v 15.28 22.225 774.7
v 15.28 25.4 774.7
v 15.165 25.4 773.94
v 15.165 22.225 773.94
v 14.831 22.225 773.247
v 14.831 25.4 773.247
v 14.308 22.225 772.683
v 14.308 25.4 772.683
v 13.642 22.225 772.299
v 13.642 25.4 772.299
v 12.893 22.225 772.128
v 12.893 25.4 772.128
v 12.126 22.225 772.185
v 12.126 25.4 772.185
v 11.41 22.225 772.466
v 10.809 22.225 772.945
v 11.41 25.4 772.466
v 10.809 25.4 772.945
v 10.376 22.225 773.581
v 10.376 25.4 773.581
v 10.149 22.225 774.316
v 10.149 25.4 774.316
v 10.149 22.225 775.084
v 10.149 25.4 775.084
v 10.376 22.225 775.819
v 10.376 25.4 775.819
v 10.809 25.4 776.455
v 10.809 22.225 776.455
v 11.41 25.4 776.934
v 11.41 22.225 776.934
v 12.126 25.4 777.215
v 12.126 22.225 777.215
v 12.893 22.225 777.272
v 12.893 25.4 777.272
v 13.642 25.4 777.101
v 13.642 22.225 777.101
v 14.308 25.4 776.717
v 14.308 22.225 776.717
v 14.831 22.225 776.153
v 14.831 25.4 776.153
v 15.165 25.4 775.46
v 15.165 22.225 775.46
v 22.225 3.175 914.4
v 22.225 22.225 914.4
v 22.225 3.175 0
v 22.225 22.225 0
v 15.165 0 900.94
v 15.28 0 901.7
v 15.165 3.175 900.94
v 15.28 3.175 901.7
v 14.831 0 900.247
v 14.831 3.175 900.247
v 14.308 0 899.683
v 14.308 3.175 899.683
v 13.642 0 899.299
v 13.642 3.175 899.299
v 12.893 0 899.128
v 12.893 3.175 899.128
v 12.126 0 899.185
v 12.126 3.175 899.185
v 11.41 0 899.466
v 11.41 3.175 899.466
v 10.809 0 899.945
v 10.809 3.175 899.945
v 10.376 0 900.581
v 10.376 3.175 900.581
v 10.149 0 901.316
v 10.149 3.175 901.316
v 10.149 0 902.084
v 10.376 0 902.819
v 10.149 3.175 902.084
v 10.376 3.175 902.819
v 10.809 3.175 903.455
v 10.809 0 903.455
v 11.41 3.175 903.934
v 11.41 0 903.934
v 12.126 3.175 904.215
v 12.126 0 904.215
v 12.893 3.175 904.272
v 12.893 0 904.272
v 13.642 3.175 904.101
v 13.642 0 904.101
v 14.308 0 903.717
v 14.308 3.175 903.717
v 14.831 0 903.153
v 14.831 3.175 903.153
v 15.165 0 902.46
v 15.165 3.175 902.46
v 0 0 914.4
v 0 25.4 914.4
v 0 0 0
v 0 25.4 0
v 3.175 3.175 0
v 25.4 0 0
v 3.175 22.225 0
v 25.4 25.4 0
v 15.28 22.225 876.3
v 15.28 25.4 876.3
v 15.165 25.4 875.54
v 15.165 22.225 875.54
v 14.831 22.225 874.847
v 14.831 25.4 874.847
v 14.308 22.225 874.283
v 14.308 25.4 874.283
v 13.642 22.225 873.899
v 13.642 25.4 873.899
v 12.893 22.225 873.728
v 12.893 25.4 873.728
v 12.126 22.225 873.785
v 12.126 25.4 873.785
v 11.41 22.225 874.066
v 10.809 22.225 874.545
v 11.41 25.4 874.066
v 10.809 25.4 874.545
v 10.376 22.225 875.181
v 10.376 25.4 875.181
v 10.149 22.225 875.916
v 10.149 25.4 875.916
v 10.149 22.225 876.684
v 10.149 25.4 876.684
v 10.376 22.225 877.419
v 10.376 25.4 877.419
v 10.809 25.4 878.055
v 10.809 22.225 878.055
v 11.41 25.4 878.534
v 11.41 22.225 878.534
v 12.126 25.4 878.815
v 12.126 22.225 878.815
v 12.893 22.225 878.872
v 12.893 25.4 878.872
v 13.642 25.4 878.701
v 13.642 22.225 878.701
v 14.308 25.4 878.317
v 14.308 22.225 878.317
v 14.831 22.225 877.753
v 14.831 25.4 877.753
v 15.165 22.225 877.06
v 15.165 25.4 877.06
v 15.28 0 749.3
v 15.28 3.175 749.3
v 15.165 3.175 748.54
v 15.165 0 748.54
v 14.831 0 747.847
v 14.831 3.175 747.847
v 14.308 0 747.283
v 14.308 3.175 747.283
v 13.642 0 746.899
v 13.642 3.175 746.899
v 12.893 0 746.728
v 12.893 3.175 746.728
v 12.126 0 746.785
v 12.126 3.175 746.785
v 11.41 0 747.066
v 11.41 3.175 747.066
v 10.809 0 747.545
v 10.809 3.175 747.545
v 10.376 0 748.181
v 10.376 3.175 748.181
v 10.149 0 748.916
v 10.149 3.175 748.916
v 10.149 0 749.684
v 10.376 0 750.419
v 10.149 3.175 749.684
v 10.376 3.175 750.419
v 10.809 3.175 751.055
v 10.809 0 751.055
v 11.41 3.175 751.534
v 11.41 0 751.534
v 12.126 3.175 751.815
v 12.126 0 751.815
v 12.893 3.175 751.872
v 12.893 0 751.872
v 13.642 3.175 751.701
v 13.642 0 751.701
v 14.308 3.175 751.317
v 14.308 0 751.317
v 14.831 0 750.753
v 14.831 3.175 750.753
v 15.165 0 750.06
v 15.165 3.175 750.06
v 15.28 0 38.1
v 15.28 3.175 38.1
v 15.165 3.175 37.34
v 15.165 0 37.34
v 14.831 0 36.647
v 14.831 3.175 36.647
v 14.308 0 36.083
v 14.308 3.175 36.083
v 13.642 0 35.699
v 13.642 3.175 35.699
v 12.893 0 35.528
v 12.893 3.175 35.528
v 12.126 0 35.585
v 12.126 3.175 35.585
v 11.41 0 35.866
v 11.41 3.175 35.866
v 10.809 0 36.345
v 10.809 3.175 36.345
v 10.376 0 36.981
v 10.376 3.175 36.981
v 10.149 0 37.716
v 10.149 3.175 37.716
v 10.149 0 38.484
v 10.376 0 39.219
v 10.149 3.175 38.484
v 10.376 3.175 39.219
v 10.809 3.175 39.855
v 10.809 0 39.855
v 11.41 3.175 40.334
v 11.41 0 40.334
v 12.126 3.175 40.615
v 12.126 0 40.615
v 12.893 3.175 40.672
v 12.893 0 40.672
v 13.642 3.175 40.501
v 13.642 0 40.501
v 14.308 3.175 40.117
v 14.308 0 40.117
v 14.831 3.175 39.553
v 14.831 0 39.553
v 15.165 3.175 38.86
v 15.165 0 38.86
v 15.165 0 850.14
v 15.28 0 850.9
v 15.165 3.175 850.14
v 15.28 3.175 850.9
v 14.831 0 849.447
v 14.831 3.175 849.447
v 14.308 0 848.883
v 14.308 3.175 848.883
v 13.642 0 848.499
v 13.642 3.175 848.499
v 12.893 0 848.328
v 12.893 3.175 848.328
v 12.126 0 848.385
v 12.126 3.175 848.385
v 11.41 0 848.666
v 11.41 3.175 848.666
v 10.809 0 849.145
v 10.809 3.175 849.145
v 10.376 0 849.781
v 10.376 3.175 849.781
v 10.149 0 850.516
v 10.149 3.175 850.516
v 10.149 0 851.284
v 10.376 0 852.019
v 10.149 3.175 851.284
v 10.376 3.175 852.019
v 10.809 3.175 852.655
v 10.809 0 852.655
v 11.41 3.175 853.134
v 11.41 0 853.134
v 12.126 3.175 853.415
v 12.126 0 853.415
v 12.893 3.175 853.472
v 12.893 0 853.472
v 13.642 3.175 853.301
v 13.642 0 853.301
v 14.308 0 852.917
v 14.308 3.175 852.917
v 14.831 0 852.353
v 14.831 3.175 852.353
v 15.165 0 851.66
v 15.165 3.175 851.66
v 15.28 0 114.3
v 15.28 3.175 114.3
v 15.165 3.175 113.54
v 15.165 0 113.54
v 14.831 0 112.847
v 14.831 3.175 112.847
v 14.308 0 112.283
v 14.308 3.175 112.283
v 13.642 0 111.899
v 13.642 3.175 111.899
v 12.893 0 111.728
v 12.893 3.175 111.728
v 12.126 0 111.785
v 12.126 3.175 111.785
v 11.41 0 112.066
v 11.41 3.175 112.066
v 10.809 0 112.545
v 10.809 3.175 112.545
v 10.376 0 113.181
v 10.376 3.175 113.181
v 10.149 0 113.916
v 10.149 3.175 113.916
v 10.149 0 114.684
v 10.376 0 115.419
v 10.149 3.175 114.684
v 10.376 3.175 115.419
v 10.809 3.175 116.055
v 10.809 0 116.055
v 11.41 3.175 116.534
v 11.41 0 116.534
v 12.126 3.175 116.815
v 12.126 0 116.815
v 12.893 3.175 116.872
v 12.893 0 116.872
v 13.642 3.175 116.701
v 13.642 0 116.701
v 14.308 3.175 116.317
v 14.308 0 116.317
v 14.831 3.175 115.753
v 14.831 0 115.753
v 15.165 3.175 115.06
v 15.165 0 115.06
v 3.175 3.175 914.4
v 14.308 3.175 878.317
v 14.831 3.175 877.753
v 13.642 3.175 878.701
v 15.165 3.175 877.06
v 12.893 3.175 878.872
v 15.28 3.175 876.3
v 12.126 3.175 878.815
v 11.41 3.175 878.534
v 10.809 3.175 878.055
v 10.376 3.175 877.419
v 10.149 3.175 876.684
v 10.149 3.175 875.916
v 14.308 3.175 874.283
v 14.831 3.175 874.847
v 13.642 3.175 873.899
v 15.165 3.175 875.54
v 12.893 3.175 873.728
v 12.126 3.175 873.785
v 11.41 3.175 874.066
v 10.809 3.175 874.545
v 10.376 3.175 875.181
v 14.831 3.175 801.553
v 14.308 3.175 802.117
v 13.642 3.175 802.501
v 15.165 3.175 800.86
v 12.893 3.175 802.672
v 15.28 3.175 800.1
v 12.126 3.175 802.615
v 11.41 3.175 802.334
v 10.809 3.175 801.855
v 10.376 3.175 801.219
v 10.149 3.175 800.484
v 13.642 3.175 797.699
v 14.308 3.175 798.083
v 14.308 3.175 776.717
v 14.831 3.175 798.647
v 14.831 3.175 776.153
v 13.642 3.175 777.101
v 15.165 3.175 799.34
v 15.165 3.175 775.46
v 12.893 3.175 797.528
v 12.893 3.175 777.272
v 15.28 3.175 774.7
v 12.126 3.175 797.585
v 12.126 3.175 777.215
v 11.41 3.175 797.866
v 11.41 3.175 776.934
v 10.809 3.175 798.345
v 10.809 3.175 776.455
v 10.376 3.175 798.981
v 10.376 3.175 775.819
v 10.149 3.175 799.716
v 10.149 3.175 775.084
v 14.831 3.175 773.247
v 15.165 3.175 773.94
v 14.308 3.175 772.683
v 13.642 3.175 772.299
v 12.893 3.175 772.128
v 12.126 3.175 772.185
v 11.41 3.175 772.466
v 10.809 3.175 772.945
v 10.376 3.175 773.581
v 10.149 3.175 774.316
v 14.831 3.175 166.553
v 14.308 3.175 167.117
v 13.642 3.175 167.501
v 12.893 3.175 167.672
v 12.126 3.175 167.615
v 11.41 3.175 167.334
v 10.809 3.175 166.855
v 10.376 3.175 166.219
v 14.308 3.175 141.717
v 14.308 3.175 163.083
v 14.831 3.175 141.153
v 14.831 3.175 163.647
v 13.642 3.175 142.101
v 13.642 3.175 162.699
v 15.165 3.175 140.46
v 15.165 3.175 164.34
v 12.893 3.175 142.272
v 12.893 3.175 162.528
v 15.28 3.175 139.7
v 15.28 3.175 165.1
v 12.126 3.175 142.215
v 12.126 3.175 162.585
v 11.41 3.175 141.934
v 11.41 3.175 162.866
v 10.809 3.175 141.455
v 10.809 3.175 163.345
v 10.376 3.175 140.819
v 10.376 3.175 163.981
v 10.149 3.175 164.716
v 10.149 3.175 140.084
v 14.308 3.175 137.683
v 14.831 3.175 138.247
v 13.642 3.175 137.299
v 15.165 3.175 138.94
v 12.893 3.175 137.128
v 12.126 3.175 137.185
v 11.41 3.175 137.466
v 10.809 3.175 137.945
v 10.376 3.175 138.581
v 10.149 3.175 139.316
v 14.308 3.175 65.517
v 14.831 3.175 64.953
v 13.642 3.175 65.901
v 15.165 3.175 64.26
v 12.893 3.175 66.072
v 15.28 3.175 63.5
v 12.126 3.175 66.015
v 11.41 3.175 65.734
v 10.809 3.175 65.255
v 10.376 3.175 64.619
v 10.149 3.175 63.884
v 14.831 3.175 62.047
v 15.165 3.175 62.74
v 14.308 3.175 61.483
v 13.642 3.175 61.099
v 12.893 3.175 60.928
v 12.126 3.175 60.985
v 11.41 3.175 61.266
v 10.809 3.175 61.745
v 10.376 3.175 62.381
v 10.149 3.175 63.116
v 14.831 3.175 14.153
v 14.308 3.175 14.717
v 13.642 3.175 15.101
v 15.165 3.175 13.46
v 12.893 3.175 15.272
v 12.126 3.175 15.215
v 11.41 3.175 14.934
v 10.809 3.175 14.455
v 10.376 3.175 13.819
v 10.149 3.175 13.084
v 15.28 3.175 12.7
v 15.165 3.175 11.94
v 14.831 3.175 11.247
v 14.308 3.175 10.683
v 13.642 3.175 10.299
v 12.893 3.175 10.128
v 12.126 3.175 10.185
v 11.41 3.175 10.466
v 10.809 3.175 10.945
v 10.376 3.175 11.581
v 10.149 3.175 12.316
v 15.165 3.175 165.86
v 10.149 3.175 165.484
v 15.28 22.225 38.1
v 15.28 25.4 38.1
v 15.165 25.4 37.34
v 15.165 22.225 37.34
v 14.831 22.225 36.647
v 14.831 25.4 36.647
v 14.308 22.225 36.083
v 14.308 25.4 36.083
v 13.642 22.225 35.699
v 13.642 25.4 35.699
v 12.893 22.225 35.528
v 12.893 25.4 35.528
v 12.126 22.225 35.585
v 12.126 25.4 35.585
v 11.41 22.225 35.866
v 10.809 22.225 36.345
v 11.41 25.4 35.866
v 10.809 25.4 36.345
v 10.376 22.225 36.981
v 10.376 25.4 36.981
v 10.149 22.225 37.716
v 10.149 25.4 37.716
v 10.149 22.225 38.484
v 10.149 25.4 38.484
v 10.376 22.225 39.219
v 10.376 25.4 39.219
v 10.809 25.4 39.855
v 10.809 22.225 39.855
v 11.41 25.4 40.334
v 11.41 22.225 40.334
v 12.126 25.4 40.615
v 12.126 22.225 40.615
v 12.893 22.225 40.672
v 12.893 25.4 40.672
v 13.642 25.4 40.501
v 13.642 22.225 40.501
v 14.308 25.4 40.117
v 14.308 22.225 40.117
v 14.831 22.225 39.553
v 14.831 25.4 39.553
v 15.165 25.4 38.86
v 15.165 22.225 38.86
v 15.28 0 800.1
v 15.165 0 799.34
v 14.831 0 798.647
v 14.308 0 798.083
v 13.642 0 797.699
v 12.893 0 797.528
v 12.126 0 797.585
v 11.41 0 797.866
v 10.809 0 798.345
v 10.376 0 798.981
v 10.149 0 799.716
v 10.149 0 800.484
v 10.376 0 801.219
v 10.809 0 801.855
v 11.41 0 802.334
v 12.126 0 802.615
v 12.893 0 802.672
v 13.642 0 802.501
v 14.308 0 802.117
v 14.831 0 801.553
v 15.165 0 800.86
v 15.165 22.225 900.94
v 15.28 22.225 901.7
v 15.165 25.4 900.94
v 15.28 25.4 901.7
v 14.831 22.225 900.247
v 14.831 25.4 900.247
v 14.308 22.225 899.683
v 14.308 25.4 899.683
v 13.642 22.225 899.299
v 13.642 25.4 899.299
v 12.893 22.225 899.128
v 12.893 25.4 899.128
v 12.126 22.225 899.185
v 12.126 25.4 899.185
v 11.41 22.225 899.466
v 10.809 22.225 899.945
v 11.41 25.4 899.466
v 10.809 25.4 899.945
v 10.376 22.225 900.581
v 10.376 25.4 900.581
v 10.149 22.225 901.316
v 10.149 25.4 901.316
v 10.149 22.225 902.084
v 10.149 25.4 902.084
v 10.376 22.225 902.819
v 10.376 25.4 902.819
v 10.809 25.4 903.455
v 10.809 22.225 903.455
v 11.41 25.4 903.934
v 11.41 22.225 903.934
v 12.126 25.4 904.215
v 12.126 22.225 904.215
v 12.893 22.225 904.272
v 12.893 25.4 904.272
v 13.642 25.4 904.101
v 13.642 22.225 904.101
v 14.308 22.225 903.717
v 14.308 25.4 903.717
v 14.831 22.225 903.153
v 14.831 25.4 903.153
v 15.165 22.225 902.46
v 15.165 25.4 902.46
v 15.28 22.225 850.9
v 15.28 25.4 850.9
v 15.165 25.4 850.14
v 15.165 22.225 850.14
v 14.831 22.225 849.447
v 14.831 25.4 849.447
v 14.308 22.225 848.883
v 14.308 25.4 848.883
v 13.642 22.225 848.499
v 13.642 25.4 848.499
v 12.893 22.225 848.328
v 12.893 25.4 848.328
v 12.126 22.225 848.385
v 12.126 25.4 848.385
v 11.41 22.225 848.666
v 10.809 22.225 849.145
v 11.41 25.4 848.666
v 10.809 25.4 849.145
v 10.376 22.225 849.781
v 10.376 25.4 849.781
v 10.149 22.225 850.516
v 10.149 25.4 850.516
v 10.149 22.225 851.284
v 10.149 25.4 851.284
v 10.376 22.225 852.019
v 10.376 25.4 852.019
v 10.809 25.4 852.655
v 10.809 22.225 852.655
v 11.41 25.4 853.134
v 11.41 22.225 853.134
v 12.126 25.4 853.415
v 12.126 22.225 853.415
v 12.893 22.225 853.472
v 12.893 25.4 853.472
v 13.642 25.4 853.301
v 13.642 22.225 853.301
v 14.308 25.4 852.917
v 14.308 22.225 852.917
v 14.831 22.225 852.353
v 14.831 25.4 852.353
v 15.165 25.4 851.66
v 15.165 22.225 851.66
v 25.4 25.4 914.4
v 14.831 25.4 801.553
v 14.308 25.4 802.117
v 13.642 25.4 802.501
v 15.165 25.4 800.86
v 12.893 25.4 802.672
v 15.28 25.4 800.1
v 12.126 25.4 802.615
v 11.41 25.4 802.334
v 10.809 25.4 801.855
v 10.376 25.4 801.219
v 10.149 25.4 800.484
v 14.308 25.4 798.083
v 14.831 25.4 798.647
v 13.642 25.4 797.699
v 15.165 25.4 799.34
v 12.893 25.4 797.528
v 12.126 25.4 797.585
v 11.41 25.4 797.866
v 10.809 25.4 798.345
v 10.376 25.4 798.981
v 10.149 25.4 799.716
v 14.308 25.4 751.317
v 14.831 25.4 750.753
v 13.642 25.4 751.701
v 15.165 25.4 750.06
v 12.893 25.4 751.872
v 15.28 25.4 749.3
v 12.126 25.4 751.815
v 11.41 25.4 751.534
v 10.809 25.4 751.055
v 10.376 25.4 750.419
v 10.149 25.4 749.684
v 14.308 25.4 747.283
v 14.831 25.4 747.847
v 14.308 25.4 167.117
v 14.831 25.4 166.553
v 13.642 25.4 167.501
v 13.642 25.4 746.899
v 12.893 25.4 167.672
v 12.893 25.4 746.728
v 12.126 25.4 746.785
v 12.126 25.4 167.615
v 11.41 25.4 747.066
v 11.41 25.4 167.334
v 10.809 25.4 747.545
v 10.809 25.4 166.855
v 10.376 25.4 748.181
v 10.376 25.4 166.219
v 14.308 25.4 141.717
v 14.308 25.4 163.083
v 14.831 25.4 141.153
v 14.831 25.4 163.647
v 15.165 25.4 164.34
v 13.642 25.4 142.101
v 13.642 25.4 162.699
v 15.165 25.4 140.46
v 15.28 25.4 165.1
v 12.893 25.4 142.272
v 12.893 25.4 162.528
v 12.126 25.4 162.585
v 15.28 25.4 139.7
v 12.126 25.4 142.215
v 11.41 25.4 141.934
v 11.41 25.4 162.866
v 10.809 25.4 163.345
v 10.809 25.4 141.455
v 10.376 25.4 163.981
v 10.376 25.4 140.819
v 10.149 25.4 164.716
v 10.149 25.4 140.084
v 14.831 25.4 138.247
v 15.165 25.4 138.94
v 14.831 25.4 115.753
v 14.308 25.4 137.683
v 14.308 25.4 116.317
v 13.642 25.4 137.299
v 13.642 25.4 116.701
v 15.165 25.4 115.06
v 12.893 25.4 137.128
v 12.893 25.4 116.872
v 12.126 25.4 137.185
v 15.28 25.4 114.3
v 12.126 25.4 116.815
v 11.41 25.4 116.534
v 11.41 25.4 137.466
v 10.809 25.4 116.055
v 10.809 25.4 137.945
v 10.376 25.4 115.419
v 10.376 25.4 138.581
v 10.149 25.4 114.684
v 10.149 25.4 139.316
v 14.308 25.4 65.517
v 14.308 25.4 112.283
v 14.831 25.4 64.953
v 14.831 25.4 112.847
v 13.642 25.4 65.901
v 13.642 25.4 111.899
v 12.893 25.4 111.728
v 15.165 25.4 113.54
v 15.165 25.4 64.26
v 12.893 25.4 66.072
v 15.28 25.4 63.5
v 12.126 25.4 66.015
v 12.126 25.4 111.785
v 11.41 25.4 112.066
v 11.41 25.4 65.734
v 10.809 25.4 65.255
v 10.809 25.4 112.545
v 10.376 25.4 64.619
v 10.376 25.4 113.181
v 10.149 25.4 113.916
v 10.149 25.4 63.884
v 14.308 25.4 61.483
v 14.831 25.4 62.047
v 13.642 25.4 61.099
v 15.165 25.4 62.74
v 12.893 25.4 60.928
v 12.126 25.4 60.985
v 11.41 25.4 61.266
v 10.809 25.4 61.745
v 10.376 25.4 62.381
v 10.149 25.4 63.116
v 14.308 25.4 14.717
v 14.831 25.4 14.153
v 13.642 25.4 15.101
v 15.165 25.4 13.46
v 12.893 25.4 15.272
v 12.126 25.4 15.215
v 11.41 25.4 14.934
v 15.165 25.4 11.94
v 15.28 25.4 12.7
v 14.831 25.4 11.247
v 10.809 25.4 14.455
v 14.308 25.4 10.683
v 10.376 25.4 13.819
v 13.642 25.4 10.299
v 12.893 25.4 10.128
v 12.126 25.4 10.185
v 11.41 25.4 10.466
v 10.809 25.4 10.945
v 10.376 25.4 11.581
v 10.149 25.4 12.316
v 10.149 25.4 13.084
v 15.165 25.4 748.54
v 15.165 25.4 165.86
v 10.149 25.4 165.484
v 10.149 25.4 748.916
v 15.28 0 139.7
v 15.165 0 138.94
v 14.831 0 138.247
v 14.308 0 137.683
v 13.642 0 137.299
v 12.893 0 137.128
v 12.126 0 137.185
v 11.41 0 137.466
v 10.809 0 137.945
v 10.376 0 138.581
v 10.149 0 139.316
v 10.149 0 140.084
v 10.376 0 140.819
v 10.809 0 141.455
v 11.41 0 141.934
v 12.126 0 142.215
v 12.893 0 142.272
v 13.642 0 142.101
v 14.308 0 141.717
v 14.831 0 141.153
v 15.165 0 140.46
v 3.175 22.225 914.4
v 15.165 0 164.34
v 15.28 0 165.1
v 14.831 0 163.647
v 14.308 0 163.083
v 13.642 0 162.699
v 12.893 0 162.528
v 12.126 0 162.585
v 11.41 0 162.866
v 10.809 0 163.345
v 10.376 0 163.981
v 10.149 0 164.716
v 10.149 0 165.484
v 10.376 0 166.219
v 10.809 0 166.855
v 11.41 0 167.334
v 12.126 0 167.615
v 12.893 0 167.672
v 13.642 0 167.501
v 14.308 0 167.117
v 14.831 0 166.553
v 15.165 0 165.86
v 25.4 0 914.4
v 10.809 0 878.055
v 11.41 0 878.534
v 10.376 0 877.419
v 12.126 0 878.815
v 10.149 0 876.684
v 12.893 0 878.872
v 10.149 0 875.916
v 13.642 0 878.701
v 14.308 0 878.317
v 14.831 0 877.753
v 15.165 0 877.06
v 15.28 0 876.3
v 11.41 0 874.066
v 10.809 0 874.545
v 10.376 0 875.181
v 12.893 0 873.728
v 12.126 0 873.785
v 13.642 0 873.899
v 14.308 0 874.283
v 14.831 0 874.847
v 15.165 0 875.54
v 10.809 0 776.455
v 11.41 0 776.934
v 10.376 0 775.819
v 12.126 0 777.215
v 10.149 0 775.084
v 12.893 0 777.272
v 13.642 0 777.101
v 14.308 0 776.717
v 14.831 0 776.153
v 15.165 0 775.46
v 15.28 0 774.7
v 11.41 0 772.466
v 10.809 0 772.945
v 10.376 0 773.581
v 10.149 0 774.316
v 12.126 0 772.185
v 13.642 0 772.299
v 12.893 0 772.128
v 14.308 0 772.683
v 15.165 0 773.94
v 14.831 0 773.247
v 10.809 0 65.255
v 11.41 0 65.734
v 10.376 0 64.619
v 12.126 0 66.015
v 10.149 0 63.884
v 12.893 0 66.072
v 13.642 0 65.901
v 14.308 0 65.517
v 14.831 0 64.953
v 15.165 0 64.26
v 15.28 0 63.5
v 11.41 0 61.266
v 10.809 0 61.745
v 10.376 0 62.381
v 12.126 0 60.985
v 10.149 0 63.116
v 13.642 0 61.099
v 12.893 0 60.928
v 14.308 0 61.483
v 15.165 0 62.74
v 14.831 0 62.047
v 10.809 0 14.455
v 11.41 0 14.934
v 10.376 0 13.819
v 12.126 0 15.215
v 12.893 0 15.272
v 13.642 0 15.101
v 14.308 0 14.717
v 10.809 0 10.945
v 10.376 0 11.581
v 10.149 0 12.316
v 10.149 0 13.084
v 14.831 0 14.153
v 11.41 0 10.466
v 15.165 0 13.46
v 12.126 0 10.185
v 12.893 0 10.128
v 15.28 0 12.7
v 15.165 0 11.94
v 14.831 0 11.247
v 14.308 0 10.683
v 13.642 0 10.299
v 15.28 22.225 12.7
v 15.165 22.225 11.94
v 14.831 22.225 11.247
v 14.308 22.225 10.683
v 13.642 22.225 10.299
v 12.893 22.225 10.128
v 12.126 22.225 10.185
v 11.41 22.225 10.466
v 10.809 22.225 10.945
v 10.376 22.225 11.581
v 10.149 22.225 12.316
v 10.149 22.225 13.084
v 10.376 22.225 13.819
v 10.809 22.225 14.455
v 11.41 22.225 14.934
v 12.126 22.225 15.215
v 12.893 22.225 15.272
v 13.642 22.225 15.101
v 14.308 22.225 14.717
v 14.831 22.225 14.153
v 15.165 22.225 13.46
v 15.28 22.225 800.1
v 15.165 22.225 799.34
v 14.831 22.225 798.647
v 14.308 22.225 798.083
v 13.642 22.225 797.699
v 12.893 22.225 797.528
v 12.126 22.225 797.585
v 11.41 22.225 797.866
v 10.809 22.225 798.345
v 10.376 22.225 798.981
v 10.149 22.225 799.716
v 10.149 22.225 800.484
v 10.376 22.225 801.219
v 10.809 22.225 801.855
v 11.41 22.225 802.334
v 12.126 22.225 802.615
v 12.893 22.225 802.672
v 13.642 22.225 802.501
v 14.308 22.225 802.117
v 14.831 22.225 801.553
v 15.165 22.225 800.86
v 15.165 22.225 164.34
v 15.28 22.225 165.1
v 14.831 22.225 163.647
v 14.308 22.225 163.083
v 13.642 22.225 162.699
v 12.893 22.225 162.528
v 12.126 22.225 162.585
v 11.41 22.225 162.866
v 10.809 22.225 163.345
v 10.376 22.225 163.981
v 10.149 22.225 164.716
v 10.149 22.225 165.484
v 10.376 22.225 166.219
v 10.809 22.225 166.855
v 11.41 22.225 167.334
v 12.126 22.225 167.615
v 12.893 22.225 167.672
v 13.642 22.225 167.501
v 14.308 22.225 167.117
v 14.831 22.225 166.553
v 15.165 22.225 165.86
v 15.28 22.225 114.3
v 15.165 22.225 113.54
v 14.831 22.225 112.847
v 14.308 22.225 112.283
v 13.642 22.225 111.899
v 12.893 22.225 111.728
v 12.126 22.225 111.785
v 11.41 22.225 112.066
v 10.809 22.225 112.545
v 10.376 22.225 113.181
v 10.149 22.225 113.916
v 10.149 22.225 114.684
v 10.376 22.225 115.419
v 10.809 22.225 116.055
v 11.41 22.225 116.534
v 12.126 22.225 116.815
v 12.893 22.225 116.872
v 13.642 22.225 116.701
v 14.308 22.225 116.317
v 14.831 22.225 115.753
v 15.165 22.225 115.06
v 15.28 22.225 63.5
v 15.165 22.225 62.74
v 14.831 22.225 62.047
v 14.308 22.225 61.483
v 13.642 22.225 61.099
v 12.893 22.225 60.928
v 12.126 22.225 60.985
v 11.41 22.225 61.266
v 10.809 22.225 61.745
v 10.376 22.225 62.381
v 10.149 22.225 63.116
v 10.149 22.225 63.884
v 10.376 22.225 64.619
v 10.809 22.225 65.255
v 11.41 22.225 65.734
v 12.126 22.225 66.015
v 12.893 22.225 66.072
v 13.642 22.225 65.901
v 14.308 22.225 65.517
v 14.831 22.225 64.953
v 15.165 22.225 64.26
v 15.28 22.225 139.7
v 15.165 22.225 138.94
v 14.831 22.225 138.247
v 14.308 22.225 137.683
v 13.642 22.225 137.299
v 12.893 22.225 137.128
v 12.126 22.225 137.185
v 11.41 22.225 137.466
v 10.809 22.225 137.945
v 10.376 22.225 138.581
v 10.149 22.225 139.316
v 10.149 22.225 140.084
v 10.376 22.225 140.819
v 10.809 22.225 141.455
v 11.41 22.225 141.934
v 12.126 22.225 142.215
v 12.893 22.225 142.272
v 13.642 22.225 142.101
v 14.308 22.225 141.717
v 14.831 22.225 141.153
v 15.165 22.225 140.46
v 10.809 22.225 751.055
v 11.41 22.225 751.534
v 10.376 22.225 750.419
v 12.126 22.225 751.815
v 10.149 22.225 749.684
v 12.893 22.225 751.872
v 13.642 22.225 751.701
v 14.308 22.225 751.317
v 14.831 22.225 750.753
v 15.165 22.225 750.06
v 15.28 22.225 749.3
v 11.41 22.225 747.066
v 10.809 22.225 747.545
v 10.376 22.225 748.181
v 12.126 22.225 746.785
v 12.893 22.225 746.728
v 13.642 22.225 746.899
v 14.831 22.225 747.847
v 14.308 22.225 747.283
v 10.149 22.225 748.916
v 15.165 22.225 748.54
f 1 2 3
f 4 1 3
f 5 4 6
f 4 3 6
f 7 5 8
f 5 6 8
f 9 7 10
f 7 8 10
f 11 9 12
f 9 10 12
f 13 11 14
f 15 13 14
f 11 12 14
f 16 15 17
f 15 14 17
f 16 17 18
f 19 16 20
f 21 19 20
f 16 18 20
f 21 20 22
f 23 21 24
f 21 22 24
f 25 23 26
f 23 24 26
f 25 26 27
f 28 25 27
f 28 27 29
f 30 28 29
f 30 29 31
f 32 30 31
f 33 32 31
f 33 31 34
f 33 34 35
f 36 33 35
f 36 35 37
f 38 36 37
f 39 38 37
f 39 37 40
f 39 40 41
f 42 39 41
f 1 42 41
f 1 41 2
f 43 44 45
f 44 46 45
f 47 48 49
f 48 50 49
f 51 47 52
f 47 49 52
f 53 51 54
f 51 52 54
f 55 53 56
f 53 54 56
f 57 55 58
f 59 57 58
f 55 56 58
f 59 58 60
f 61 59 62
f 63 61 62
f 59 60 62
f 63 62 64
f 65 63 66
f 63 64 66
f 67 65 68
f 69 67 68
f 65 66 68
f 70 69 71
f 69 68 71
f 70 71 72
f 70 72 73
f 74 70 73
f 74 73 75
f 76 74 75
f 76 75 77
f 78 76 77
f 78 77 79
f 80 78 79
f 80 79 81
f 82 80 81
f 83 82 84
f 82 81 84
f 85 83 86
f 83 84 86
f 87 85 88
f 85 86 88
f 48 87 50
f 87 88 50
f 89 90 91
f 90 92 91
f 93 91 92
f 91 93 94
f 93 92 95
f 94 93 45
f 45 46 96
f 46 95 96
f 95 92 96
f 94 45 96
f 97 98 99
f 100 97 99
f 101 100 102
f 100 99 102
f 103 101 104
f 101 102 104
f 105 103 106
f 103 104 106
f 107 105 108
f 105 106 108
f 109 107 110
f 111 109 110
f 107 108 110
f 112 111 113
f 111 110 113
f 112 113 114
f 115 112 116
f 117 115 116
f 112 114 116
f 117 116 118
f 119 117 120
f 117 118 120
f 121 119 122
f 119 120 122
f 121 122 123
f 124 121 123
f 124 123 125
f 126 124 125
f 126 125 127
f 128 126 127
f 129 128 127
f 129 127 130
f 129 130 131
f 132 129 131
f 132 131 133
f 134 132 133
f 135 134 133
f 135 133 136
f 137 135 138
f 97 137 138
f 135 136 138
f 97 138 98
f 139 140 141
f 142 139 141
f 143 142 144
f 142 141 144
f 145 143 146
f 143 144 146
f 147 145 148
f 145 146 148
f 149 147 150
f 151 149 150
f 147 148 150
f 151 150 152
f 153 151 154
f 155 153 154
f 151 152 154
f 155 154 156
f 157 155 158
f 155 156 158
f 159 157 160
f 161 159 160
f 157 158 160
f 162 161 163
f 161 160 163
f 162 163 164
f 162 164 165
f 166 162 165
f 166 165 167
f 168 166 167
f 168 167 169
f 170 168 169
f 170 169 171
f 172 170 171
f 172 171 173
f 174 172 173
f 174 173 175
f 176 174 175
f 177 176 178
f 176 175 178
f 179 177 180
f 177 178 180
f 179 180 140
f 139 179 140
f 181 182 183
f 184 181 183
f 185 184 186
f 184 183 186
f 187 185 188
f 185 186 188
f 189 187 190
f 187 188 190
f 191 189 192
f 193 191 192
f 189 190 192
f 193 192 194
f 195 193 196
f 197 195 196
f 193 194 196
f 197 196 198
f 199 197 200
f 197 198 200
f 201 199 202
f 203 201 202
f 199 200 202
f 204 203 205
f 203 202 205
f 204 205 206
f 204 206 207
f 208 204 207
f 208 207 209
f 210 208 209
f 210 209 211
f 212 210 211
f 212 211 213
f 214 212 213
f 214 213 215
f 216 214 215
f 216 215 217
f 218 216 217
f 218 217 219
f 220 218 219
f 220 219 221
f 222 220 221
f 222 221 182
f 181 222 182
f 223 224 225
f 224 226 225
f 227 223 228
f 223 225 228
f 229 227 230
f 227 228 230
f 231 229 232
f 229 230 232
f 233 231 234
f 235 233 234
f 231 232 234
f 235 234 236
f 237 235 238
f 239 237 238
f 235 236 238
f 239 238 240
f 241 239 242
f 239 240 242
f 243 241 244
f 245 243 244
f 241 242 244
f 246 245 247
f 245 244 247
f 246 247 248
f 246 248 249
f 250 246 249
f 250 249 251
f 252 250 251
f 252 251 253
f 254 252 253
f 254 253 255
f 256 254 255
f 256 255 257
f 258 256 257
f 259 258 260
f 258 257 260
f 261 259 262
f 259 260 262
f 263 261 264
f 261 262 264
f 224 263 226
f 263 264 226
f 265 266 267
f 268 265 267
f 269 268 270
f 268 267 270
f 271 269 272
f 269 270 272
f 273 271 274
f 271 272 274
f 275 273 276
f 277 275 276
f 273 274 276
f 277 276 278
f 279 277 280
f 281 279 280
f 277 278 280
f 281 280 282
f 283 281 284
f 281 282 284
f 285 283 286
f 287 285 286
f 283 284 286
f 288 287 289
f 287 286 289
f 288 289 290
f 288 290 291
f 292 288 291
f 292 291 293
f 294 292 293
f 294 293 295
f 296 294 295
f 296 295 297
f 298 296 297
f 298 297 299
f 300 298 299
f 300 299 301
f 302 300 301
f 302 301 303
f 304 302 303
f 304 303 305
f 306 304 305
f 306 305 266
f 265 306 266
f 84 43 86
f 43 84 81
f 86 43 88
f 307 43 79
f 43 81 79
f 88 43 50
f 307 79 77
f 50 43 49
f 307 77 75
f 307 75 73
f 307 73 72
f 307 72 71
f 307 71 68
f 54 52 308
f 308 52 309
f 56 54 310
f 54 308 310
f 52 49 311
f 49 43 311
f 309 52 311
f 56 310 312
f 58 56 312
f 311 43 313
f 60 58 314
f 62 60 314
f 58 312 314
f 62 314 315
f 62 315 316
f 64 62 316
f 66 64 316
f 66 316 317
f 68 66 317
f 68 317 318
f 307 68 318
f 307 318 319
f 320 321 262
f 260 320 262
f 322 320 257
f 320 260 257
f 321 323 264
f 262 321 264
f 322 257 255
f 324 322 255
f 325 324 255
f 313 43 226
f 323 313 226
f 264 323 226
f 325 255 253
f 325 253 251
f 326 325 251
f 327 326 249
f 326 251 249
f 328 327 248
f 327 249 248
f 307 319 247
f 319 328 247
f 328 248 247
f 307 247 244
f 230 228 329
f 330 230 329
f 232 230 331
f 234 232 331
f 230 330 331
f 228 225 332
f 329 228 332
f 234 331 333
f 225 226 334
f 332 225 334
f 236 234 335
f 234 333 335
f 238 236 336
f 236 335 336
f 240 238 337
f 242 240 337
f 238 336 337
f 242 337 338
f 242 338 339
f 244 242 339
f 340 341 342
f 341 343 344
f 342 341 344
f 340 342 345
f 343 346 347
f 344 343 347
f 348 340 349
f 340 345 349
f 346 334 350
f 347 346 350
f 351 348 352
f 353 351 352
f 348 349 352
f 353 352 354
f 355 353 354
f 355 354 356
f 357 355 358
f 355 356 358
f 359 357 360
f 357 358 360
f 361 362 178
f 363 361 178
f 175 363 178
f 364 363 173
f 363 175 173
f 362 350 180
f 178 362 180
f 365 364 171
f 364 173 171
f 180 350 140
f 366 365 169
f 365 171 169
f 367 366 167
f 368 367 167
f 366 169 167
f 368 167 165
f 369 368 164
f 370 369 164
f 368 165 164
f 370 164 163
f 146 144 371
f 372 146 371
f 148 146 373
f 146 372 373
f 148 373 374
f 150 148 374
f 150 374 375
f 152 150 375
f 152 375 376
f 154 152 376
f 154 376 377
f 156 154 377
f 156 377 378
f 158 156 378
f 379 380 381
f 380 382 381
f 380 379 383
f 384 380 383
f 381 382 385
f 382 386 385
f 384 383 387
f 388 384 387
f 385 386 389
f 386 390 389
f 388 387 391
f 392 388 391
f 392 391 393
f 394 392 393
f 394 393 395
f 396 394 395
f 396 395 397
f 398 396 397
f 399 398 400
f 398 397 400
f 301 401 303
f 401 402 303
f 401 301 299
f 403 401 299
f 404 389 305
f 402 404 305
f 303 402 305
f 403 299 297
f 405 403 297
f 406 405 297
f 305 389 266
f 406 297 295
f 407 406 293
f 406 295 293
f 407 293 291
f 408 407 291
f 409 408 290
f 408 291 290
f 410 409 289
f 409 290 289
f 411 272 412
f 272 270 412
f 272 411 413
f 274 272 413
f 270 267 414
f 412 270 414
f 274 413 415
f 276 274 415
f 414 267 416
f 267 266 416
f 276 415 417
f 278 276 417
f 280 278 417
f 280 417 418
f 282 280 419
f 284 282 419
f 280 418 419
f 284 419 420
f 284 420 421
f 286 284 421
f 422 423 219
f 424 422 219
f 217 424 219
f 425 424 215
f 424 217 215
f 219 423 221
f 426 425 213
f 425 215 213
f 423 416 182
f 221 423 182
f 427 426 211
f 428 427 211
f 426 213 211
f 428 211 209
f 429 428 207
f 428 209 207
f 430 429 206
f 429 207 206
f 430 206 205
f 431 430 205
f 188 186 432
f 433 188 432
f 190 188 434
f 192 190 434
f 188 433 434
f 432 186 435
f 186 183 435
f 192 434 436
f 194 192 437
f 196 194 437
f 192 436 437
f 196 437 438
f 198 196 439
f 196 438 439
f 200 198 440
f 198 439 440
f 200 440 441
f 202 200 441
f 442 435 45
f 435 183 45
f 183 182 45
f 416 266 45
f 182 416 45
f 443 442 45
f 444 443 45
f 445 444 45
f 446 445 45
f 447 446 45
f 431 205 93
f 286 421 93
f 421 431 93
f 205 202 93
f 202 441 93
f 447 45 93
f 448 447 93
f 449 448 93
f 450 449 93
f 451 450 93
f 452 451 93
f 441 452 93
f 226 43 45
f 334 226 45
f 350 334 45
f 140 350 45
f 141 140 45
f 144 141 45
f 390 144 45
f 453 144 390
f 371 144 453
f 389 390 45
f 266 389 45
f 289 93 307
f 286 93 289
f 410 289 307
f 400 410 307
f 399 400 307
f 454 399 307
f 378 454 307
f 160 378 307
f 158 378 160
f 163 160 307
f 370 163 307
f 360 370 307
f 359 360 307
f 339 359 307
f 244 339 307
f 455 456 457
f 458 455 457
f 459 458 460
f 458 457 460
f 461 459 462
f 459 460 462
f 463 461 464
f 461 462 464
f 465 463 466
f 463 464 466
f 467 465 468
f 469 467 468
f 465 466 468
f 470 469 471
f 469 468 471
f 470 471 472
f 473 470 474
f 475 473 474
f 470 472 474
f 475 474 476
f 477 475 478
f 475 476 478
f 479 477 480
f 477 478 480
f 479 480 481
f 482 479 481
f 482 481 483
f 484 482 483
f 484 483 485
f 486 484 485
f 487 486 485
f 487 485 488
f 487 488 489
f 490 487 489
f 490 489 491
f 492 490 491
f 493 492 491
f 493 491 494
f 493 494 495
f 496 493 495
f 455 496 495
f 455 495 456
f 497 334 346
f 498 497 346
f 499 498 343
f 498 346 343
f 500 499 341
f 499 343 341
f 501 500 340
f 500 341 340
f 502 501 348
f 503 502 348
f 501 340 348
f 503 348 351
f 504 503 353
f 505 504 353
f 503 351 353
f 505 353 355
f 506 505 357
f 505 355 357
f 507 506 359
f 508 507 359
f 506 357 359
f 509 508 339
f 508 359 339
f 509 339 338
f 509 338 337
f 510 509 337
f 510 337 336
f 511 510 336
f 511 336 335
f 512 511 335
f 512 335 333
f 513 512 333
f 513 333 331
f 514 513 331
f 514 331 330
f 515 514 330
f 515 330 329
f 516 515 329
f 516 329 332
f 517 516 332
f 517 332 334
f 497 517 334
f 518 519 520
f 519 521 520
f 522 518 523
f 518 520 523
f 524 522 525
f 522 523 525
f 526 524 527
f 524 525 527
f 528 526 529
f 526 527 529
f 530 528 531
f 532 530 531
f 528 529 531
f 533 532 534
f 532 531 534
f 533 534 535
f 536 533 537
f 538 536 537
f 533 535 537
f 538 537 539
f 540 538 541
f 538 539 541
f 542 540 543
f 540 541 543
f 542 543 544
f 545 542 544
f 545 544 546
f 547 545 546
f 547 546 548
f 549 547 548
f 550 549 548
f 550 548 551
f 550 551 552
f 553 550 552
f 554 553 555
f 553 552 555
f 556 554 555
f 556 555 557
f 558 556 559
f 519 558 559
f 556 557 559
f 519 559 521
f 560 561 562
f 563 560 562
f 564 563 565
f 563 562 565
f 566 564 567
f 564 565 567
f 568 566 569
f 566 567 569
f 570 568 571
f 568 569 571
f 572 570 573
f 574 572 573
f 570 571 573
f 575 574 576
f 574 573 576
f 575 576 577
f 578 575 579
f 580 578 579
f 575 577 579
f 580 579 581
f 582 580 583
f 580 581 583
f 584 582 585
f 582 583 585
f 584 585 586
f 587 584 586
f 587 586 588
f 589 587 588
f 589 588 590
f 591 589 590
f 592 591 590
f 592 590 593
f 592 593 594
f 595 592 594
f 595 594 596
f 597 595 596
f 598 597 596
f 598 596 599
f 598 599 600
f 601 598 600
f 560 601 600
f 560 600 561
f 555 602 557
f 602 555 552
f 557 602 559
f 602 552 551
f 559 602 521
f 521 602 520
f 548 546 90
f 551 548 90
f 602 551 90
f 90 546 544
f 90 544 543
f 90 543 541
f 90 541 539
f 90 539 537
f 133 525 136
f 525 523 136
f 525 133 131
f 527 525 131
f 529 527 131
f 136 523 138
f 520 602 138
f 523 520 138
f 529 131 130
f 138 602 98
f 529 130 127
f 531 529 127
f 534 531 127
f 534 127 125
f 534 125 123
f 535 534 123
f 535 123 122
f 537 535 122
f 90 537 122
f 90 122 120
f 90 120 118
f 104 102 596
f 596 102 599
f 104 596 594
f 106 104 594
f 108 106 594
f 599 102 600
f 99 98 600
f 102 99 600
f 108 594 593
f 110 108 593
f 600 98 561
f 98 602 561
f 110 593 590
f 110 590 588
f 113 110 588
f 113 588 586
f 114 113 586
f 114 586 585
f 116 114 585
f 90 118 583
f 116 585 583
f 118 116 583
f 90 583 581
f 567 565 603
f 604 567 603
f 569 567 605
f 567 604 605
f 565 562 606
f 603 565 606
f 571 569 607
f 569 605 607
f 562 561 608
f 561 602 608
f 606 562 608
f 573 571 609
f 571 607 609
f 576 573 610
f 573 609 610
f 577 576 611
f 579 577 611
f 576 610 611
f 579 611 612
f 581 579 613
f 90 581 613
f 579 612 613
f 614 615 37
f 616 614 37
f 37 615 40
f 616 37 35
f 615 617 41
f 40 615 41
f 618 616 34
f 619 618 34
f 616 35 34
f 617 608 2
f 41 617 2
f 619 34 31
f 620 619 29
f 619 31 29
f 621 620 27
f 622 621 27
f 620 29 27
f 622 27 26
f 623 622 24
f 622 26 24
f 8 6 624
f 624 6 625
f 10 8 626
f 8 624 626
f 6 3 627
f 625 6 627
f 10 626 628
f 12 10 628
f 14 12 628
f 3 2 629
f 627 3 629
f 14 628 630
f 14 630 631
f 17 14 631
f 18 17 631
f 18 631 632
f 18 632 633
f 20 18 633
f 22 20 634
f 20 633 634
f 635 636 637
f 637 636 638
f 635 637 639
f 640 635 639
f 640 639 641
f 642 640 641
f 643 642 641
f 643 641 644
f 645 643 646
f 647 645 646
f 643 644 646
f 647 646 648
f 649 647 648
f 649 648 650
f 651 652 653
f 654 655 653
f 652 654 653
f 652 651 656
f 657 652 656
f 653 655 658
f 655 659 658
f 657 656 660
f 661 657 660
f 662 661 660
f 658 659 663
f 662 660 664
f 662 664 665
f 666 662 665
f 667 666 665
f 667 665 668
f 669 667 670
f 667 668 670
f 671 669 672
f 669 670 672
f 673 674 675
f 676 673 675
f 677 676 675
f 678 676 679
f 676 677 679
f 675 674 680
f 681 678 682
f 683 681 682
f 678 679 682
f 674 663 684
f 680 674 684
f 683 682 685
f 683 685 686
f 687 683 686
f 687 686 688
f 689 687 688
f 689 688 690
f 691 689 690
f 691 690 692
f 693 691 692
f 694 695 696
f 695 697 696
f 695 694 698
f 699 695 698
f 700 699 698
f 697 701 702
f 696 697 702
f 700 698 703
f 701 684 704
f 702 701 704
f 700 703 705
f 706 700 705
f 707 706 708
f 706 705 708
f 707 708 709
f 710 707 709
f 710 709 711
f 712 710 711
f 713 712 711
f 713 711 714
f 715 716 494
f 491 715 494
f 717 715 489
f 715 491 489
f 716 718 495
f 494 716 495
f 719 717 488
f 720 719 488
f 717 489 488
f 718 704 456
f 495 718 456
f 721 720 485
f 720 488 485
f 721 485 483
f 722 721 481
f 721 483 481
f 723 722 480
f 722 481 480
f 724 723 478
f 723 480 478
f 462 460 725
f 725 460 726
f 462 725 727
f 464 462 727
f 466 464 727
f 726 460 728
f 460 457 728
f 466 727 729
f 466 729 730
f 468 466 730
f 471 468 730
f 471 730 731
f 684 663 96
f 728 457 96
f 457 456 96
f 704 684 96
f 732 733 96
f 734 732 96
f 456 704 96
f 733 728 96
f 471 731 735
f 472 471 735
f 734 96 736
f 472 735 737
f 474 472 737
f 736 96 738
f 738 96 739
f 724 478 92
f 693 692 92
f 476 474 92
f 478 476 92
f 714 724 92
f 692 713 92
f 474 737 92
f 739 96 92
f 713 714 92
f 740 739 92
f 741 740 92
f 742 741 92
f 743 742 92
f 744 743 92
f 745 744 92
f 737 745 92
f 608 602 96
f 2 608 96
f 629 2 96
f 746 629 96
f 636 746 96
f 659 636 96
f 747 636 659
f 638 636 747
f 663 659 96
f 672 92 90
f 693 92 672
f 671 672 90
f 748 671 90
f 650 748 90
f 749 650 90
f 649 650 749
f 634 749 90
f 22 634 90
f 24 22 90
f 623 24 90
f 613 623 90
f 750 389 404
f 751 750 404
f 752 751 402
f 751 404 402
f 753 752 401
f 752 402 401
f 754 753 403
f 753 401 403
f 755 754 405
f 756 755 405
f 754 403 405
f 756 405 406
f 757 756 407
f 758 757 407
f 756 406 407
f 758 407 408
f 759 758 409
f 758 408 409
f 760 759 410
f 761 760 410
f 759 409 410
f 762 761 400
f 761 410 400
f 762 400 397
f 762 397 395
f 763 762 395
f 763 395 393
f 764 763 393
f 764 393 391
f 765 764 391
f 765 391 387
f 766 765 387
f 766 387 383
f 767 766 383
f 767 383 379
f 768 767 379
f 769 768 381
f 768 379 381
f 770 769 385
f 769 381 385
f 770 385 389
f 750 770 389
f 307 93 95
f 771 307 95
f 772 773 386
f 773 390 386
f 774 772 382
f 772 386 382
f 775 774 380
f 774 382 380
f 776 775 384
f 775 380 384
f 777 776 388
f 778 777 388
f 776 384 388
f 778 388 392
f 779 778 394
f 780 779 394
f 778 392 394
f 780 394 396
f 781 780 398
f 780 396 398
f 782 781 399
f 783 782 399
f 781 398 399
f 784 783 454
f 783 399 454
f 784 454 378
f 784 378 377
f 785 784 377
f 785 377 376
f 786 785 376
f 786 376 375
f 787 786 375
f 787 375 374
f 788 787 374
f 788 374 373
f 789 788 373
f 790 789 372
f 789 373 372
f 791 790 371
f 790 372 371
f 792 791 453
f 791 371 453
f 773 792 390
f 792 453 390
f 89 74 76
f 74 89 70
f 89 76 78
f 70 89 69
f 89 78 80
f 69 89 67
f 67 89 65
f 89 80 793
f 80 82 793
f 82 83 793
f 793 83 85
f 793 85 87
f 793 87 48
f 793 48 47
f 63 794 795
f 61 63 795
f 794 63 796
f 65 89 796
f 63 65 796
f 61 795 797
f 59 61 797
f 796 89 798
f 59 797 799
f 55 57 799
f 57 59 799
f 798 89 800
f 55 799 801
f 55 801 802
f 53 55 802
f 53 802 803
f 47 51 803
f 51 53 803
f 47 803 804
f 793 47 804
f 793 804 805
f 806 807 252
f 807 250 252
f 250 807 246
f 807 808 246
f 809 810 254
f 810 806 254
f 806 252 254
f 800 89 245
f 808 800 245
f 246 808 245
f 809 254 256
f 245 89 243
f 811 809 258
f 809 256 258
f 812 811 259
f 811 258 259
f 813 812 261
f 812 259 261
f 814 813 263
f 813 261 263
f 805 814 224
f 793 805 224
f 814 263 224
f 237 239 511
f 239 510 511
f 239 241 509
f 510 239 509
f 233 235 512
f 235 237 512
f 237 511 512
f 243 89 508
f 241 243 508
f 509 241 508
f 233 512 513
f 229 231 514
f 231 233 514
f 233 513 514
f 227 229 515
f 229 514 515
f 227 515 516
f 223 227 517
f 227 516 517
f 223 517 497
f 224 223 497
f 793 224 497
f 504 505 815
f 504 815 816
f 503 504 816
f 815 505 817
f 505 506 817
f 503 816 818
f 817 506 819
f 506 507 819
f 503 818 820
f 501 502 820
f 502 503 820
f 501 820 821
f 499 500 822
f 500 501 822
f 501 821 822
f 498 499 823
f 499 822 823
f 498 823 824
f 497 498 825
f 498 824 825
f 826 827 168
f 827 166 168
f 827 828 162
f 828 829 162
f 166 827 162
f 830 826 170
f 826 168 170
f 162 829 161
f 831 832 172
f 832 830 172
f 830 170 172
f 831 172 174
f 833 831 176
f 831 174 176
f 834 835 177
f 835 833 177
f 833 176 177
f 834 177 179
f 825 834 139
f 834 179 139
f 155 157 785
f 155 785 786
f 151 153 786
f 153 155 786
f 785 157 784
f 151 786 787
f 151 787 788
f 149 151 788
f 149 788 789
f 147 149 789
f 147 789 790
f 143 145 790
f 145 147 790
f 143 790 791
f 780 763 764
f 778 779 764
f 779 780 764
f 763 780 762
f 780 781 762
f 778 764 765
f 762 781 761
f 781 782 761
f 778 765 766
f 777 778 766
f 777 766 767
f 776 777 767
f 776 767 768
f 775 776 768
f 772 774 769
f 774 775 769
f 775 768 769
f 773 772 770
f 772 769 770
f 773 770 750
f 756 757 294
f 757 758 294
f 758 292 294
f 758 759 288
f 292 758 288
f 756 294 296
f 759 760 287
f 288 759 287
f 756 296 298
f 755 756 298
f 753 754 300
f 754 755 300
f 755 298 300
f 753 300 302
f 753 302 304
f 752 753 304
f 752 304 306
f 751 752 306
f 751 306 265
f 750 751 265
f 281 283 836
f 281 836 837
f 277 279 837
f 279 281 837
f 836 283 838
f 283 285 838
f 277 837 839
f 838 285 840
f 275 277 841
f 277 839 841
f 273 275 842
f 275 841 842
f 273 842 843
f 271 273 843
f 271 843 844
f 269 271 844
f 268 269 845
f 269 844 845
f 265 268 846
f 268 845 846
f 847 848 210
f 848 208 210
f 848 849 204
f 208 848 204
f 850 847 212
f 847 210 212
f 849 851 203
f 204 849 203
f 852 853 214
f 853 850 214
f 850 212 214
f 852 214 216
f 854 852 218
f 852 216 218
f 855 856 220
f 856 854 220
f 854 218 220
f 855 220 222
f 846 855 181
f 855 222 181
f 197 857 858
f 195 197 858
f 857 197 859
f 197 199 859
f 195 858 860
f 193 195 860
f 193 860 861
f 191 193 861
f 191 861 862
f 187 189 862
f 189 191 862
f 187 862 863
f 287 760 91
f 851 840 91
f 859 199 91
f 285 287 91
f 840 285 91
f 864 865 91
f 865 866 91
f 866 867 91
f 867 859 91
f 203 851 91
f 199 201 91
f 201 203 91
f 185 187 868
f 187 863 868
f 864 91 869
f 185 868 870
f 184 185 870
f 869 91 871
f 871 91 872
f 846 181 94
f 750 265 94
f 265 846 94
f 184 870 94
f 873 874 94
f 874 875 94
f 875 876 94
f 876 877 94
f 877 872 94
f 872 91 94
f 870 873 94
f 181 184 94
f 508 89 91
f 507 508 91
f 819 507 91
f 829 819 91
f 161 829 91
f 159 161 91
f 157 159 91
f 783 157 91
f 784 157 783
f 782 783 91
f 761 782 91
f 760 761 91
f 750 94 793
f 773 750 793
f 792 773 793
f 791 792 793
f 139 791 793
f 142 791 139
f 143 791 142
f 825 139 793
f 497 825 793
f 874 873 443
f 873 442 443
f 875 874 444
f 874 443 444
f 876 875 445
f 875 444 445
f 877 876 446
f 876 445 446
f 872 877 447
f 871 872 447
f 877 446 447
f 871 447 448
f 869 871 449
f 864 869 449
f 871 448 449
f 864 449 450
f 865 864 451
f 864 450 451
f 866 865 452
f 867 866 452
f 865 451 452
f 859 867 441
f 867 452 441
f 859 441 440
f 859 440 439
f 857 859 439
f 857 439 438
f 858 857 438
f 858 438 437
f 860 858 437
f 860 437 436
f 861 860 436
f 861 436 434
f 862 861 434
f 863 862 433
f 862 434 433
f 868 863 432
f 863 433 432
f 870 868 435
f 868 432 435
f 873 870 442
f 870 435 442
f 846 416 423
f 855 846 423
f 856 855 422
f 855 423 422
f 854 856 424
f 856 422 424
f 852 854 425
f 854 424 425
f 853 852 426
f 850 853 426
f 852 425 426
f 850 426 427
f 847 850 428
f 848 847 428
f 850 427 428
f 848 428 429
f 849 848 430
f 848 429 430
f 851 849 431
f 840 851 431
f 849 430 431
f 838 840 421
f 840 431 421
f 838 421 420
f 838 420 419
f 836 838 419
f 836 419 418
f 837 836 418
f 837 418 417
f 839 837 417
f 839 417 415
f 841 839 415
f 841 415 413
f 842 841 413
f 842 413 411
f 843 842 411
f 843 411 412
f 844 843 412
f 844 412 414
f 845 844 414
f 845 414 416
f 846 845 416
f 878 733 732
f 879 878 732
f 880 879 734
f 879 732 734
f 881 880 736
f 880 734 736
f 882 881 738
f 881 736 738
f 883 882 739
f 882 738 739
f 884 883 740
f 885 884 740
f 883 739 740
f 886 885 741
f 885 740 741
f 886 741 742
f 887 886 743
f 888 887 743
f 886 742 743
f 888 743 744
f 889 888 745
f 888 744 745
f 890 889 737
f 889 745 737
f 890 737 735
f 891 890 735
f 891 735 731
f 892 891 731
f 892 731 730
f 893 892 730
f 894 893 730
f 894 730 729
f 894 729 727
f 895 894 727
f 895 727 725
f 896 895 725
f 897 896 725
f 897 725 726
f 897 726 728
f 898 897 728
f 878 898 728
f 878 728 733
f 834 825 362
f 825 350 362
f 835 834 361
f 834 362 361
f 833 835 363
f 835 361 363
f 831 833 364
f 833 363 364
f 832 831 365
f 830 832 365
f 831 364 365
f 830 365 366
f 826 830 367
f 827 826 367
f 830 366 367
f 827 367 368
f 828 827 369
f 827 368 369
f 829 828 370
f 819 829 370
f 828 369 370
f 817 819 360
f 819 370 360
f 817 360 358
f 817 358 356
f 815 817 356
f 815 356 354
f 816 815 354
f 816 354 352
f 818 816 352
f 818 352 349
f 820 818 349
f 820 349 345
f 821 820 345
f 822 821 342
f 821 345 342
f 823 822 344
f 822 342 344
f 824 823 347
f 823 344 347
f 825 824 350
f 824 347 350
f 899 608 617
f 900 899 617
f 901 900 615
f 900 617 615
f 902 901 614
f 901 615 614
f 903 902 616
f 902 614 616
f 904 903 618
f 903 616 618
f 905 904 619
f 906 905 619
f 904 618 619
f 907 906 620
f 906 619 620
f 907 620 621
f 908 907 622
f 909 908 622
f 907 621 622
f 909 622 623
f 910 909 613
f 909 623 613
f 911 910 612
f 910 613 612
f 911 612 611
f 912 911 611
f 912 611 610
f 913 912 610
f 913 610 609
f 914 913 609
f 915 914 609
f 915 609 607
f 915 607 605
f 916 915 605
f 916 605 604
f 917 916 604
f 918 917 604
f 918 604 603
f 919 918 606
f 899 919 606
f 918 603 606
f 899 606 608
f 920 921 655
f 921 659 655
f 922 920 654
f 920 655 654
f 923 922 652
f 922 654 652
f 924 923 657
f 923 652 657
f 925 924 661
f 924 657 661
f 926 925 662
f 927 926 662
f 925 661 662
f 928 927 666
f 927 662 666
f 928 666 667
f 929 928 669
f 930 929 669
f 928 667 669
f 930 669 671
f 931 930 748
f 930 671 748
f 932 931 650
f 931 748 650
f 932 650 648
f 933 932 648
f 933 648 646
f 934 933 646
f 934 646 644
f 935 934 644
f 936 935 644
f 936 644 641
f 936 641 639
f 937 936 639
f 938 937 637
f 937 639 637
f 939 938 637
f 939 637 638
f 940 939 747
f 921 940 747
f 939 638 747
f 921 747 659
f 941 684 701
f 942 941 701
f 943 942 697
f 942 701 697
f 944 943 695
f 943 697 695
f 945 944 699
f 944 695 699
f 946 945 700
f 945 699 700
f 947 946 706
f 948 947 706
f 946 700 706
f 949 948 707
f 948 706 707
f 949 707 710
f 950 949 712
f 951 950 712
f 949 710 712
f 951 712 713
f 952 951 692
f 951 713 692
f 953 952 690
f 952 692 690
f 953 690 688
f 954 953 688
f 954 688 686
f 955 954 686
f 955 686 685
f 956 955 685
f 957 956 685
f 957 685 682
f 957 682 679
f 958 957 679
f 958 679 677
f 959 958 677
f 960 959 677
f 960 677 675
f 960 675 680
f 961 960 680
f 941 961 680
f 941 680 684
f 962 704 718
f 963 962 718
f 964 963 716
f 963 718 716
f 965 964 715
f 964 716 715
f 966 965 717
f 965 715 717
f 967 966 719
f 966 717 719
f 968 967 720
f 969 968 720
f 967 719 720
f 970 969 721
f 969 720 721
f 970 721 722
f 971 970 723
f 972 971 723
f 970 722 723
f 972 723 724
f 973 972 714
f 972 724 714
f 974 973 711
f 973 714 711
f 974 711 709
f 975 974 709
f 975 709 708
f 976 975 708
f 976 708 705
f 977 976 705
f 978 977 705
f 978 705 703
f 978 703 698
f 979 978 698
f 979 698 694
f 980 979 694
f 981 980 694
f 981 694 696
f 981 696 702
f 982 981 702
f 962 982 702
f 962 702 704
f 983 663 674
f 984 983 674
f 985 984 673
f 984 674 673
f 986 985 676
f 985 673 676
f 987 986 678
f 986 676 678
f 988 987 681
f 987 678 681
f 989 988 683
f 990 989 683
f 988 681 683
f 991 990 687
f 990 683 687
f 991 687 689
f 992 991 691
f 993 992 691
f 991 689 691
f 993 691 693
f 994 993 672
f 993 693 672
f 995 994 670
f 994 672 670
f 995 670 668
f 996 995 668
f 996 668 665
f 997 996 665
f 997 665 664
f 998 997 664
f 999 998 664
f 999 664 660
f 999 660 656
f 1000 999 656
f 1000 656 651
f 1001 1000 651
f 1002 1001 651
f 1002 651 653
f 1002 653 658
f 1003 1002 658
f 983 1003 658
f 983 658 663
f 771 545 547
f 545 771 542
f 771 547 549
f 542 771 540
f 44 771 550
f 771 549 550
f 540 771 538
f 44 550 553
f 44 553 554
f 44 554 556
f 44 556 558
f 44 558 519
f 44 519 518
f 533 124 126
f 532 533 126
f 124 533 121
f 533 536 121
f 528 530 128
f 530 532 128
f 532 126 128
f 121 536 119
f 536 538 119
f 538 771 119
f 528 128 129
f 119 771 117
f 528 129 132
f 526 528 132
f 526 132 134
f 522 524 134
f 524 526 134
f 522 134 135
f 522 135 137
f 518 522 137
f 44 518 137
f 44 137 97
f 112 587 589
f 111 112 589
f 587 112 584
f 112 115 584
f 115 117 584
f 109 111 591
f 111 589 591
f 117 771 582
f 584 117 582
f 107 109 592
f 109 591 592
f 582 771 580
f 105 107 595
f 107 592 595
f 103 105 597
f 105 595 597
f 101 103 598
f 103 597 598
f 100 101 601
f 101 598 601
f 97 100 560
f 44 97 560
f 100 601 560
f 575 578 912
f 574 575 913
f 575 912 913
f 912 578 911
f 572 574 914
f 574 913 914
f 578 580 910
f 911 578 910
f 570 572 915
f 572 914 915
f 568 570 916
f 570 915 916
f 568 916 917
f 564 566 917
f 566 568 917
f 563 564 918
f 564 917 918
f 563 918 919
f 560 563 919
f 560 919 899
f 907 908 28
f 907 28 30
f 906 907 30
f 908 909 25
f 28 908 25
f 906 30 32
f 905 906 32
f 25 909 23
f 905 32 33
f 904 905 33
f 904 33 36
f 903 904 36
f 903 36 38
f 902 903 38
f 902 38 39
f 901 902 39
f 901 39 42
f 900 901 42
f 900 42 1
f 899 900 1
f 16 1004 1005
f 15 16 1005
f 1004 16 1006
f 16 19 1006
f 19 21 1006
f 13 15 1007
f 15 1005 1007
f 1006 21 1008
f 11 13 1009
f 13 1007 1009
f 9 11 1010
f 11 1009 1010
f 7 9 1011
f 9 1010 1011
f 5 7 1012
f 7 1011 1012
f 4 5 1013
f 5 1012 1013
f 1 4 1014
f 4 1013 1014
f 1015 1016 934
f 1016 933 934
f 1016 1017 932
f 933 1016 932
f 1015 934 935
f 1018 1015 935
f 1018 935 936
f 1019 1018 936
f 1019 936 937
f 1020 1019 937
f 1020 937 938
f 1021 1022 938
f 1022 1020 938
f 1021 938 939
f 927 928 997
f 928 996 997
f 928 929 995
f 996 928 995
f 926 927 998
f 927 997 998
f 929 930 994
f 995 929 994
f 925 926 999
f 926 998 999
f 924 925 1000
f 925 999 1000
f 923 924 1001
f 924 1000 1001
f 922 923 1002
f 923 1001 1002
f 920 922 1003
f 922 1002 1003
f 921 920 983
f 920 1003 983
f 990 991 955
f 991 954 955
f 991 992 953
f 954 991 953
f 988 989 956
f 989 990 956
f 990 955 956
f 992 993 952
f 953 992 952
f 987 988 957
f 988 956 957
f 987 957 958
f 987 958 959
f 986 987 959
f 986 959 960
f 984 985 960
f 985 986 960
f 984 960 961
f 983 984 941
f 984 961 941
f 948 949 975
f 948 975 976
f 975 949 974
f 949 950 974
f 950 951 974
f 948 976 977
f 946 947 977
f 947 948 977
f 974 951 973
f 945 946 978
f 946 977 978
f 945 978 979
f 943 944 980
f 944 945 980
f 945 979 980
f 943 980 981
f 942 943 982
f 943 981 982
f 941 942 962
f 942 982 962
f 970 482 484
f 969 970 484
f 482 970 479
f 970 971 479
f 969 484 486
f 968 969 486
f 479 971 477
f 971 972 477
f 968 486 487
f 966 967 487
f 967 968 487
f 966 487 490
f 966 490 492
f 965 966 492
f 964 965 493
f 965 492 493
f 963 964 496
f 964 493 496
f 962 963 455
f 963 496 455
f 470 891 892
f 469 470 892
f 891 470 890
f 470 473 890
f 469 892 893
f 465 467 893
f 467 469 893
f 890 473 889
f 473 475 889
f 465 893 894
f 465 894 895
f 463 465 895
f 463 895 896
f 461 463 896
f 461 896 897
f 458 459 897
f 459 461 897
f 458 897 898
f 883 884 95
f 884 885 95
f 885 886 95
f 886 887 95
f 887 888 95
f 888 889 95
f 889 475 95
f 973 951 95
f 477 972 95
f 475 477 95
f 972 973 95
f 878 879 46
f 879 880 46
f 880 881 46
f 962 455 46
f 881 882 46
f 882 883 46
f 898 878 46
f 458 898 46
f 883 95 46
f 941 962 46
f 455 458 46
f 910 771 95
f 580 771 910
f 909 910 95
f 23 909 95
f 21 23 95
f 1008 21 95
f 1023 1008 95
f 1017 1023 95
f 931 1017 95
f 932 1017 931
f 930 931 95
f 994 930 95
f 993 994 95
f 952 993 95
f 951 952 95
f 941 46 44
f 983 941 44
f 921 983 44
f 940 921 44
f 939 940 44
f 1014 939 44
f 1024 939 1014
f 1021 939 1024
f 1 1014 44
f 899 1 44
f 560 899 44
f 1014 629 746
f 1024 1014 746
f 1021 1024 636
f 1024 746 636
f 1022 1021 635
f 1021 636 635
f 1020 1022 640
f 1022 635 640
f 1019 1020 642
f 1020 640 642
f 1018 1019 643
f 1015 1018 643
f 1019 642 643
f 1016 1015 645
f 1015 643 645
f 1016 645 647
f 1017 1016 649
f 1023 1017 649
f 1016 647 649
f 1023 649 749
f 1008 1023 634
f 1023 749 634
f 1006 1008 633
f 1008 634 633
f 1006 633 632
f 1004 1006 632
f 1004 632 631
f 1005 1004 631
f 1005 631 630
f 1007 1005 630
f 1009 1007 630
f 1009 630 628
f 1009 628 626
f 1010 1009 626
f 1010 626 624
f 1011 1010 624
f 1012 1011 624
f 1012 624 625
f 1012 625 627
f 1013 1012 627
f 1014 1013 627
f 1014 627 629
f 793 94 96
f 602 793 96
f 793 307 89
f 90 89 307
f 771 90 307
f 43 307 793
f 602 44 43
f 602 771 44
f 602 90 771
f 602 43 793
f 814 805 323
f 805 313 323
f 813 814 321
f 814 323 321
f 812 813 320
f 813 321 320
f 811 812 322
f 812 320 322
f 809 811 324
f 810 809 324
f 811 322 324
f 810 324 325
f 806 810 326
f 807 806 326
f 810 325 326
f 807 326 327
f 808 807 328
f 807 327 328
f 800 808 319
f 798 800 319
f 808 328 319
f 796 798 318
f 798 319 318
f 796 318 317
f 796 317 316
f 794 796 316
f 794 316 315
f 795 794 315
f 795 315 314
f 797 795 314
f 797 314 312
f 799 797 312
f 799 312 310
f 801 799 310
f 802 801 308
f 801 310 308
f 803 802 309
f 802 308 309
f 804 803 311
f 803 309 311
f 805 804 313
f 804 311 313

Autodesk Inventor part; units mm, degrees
ref_plane "YZ Plane" through (0, 0, 0) normal (1, 0, 0) x (0, 1, 0)
ref_plane "XZ Plane" through (0, 0, 0) normal (0, 1, 0) x (-1, 0, 0)
ref_plane "XY Plane" through (0, 0, 0) normal (0, 0, 1) x (1, 0, 0)
sketch "Sketch1" plane through (0, 0, 0) normal (0, 0, 1) x (1, 0, 0)
  line L0 (0, 0) -> (25.4, 0)
  line L1 (25.4, 0) -> (25.4, 25.4)
  line L2 (25.4, 25.4) -> (0, 25.4)
  line L3 (0, 25.4) -> (0, 0)
  line L4 (3.175, 22.225) -> (22.225, 22.225)
  line L5 (22.225, 22.225) -> (22.225, 3.175)
  line L6 (22.225, 3.175) -> (3.175, 3.175)
  line L7 (3.175, 3.175) -> (3.175, 22.225)
  dimension "d0" = 25.4
  dimension "d1" = 25.4
  dimension "d2" = 3.175
extrude "Extrusion1" add sketch "Sketch1" along normal blind 914.4
sketch "Sketch2" plane through (0, 25.4, 0) normal (0, 1, 0) x (1, 0, 0)
  line L0 (0, 0) -> (25.4, 0) construction
  line L1 (12.7, 0) -> (12.7, -12.7) construction
  line L2 (12.7, -12.7) -> (12.7, -38.1) construction
  line L3 (12.7, -38.1) -> (12.7, -63.5) construction
  line L4 (0, 0) -> (0, -914.4) construction
  line L5 (0, 0) -> (0, -139.7) construction
  line L6 (0, -139.7) -> (25.4, -139.7) construction
  line L7 (12.7, -139.7) -> (12.7, -114.3) construction
  line L8 (12.7, -114.3) -> (12.7, -165.1) construction
  line L9 (0, -457.2) -> (25.4, -457.2) construction
  line L10 (25.4, 0) -> (25.4, -914.4) construction
  circle A0 centre (12.7, -139.7) radius 2.5797
  circle A1 centre (12.7, -114.3) radius 2.5797
  circle A2 centre (12.7, -165.1) radius 2.5797
  circle A3 centre (12.7, -63.5) radius 2.5797
  circle A4 centre (12.7, -38.1) radius 2.5797
  circle A5 centre (12.7, -12.7) radius 2.5797
  circle A6 centre (12.7, -774.7) radius 2.5797
  circle A7 centre (12.7, -800.1) radius 2.5797
  circle A8 centre (12.7, -749.3) radius 2.5797
  circle A9 centre (12.7, -850.9) radius 2.5797
  circle A10 centre (12.7, -876.3) radius 2.5797
  circle A11 centre (12.7, -901.7) radius 2.5797
  dimension "d5" = 12.7
  dimension "d6" = 25.4
  dimension "d7" = 25.4
  dimension "d8" = 139.7
  dimension "d9" = 25.4
  dimension "d10" = 50.8
  dimension "d11" = 5.1594
extrude "Extrusion2" cut sketch "Sketch2" against normal blind 914.4
properties part number "3ft 1x1"
